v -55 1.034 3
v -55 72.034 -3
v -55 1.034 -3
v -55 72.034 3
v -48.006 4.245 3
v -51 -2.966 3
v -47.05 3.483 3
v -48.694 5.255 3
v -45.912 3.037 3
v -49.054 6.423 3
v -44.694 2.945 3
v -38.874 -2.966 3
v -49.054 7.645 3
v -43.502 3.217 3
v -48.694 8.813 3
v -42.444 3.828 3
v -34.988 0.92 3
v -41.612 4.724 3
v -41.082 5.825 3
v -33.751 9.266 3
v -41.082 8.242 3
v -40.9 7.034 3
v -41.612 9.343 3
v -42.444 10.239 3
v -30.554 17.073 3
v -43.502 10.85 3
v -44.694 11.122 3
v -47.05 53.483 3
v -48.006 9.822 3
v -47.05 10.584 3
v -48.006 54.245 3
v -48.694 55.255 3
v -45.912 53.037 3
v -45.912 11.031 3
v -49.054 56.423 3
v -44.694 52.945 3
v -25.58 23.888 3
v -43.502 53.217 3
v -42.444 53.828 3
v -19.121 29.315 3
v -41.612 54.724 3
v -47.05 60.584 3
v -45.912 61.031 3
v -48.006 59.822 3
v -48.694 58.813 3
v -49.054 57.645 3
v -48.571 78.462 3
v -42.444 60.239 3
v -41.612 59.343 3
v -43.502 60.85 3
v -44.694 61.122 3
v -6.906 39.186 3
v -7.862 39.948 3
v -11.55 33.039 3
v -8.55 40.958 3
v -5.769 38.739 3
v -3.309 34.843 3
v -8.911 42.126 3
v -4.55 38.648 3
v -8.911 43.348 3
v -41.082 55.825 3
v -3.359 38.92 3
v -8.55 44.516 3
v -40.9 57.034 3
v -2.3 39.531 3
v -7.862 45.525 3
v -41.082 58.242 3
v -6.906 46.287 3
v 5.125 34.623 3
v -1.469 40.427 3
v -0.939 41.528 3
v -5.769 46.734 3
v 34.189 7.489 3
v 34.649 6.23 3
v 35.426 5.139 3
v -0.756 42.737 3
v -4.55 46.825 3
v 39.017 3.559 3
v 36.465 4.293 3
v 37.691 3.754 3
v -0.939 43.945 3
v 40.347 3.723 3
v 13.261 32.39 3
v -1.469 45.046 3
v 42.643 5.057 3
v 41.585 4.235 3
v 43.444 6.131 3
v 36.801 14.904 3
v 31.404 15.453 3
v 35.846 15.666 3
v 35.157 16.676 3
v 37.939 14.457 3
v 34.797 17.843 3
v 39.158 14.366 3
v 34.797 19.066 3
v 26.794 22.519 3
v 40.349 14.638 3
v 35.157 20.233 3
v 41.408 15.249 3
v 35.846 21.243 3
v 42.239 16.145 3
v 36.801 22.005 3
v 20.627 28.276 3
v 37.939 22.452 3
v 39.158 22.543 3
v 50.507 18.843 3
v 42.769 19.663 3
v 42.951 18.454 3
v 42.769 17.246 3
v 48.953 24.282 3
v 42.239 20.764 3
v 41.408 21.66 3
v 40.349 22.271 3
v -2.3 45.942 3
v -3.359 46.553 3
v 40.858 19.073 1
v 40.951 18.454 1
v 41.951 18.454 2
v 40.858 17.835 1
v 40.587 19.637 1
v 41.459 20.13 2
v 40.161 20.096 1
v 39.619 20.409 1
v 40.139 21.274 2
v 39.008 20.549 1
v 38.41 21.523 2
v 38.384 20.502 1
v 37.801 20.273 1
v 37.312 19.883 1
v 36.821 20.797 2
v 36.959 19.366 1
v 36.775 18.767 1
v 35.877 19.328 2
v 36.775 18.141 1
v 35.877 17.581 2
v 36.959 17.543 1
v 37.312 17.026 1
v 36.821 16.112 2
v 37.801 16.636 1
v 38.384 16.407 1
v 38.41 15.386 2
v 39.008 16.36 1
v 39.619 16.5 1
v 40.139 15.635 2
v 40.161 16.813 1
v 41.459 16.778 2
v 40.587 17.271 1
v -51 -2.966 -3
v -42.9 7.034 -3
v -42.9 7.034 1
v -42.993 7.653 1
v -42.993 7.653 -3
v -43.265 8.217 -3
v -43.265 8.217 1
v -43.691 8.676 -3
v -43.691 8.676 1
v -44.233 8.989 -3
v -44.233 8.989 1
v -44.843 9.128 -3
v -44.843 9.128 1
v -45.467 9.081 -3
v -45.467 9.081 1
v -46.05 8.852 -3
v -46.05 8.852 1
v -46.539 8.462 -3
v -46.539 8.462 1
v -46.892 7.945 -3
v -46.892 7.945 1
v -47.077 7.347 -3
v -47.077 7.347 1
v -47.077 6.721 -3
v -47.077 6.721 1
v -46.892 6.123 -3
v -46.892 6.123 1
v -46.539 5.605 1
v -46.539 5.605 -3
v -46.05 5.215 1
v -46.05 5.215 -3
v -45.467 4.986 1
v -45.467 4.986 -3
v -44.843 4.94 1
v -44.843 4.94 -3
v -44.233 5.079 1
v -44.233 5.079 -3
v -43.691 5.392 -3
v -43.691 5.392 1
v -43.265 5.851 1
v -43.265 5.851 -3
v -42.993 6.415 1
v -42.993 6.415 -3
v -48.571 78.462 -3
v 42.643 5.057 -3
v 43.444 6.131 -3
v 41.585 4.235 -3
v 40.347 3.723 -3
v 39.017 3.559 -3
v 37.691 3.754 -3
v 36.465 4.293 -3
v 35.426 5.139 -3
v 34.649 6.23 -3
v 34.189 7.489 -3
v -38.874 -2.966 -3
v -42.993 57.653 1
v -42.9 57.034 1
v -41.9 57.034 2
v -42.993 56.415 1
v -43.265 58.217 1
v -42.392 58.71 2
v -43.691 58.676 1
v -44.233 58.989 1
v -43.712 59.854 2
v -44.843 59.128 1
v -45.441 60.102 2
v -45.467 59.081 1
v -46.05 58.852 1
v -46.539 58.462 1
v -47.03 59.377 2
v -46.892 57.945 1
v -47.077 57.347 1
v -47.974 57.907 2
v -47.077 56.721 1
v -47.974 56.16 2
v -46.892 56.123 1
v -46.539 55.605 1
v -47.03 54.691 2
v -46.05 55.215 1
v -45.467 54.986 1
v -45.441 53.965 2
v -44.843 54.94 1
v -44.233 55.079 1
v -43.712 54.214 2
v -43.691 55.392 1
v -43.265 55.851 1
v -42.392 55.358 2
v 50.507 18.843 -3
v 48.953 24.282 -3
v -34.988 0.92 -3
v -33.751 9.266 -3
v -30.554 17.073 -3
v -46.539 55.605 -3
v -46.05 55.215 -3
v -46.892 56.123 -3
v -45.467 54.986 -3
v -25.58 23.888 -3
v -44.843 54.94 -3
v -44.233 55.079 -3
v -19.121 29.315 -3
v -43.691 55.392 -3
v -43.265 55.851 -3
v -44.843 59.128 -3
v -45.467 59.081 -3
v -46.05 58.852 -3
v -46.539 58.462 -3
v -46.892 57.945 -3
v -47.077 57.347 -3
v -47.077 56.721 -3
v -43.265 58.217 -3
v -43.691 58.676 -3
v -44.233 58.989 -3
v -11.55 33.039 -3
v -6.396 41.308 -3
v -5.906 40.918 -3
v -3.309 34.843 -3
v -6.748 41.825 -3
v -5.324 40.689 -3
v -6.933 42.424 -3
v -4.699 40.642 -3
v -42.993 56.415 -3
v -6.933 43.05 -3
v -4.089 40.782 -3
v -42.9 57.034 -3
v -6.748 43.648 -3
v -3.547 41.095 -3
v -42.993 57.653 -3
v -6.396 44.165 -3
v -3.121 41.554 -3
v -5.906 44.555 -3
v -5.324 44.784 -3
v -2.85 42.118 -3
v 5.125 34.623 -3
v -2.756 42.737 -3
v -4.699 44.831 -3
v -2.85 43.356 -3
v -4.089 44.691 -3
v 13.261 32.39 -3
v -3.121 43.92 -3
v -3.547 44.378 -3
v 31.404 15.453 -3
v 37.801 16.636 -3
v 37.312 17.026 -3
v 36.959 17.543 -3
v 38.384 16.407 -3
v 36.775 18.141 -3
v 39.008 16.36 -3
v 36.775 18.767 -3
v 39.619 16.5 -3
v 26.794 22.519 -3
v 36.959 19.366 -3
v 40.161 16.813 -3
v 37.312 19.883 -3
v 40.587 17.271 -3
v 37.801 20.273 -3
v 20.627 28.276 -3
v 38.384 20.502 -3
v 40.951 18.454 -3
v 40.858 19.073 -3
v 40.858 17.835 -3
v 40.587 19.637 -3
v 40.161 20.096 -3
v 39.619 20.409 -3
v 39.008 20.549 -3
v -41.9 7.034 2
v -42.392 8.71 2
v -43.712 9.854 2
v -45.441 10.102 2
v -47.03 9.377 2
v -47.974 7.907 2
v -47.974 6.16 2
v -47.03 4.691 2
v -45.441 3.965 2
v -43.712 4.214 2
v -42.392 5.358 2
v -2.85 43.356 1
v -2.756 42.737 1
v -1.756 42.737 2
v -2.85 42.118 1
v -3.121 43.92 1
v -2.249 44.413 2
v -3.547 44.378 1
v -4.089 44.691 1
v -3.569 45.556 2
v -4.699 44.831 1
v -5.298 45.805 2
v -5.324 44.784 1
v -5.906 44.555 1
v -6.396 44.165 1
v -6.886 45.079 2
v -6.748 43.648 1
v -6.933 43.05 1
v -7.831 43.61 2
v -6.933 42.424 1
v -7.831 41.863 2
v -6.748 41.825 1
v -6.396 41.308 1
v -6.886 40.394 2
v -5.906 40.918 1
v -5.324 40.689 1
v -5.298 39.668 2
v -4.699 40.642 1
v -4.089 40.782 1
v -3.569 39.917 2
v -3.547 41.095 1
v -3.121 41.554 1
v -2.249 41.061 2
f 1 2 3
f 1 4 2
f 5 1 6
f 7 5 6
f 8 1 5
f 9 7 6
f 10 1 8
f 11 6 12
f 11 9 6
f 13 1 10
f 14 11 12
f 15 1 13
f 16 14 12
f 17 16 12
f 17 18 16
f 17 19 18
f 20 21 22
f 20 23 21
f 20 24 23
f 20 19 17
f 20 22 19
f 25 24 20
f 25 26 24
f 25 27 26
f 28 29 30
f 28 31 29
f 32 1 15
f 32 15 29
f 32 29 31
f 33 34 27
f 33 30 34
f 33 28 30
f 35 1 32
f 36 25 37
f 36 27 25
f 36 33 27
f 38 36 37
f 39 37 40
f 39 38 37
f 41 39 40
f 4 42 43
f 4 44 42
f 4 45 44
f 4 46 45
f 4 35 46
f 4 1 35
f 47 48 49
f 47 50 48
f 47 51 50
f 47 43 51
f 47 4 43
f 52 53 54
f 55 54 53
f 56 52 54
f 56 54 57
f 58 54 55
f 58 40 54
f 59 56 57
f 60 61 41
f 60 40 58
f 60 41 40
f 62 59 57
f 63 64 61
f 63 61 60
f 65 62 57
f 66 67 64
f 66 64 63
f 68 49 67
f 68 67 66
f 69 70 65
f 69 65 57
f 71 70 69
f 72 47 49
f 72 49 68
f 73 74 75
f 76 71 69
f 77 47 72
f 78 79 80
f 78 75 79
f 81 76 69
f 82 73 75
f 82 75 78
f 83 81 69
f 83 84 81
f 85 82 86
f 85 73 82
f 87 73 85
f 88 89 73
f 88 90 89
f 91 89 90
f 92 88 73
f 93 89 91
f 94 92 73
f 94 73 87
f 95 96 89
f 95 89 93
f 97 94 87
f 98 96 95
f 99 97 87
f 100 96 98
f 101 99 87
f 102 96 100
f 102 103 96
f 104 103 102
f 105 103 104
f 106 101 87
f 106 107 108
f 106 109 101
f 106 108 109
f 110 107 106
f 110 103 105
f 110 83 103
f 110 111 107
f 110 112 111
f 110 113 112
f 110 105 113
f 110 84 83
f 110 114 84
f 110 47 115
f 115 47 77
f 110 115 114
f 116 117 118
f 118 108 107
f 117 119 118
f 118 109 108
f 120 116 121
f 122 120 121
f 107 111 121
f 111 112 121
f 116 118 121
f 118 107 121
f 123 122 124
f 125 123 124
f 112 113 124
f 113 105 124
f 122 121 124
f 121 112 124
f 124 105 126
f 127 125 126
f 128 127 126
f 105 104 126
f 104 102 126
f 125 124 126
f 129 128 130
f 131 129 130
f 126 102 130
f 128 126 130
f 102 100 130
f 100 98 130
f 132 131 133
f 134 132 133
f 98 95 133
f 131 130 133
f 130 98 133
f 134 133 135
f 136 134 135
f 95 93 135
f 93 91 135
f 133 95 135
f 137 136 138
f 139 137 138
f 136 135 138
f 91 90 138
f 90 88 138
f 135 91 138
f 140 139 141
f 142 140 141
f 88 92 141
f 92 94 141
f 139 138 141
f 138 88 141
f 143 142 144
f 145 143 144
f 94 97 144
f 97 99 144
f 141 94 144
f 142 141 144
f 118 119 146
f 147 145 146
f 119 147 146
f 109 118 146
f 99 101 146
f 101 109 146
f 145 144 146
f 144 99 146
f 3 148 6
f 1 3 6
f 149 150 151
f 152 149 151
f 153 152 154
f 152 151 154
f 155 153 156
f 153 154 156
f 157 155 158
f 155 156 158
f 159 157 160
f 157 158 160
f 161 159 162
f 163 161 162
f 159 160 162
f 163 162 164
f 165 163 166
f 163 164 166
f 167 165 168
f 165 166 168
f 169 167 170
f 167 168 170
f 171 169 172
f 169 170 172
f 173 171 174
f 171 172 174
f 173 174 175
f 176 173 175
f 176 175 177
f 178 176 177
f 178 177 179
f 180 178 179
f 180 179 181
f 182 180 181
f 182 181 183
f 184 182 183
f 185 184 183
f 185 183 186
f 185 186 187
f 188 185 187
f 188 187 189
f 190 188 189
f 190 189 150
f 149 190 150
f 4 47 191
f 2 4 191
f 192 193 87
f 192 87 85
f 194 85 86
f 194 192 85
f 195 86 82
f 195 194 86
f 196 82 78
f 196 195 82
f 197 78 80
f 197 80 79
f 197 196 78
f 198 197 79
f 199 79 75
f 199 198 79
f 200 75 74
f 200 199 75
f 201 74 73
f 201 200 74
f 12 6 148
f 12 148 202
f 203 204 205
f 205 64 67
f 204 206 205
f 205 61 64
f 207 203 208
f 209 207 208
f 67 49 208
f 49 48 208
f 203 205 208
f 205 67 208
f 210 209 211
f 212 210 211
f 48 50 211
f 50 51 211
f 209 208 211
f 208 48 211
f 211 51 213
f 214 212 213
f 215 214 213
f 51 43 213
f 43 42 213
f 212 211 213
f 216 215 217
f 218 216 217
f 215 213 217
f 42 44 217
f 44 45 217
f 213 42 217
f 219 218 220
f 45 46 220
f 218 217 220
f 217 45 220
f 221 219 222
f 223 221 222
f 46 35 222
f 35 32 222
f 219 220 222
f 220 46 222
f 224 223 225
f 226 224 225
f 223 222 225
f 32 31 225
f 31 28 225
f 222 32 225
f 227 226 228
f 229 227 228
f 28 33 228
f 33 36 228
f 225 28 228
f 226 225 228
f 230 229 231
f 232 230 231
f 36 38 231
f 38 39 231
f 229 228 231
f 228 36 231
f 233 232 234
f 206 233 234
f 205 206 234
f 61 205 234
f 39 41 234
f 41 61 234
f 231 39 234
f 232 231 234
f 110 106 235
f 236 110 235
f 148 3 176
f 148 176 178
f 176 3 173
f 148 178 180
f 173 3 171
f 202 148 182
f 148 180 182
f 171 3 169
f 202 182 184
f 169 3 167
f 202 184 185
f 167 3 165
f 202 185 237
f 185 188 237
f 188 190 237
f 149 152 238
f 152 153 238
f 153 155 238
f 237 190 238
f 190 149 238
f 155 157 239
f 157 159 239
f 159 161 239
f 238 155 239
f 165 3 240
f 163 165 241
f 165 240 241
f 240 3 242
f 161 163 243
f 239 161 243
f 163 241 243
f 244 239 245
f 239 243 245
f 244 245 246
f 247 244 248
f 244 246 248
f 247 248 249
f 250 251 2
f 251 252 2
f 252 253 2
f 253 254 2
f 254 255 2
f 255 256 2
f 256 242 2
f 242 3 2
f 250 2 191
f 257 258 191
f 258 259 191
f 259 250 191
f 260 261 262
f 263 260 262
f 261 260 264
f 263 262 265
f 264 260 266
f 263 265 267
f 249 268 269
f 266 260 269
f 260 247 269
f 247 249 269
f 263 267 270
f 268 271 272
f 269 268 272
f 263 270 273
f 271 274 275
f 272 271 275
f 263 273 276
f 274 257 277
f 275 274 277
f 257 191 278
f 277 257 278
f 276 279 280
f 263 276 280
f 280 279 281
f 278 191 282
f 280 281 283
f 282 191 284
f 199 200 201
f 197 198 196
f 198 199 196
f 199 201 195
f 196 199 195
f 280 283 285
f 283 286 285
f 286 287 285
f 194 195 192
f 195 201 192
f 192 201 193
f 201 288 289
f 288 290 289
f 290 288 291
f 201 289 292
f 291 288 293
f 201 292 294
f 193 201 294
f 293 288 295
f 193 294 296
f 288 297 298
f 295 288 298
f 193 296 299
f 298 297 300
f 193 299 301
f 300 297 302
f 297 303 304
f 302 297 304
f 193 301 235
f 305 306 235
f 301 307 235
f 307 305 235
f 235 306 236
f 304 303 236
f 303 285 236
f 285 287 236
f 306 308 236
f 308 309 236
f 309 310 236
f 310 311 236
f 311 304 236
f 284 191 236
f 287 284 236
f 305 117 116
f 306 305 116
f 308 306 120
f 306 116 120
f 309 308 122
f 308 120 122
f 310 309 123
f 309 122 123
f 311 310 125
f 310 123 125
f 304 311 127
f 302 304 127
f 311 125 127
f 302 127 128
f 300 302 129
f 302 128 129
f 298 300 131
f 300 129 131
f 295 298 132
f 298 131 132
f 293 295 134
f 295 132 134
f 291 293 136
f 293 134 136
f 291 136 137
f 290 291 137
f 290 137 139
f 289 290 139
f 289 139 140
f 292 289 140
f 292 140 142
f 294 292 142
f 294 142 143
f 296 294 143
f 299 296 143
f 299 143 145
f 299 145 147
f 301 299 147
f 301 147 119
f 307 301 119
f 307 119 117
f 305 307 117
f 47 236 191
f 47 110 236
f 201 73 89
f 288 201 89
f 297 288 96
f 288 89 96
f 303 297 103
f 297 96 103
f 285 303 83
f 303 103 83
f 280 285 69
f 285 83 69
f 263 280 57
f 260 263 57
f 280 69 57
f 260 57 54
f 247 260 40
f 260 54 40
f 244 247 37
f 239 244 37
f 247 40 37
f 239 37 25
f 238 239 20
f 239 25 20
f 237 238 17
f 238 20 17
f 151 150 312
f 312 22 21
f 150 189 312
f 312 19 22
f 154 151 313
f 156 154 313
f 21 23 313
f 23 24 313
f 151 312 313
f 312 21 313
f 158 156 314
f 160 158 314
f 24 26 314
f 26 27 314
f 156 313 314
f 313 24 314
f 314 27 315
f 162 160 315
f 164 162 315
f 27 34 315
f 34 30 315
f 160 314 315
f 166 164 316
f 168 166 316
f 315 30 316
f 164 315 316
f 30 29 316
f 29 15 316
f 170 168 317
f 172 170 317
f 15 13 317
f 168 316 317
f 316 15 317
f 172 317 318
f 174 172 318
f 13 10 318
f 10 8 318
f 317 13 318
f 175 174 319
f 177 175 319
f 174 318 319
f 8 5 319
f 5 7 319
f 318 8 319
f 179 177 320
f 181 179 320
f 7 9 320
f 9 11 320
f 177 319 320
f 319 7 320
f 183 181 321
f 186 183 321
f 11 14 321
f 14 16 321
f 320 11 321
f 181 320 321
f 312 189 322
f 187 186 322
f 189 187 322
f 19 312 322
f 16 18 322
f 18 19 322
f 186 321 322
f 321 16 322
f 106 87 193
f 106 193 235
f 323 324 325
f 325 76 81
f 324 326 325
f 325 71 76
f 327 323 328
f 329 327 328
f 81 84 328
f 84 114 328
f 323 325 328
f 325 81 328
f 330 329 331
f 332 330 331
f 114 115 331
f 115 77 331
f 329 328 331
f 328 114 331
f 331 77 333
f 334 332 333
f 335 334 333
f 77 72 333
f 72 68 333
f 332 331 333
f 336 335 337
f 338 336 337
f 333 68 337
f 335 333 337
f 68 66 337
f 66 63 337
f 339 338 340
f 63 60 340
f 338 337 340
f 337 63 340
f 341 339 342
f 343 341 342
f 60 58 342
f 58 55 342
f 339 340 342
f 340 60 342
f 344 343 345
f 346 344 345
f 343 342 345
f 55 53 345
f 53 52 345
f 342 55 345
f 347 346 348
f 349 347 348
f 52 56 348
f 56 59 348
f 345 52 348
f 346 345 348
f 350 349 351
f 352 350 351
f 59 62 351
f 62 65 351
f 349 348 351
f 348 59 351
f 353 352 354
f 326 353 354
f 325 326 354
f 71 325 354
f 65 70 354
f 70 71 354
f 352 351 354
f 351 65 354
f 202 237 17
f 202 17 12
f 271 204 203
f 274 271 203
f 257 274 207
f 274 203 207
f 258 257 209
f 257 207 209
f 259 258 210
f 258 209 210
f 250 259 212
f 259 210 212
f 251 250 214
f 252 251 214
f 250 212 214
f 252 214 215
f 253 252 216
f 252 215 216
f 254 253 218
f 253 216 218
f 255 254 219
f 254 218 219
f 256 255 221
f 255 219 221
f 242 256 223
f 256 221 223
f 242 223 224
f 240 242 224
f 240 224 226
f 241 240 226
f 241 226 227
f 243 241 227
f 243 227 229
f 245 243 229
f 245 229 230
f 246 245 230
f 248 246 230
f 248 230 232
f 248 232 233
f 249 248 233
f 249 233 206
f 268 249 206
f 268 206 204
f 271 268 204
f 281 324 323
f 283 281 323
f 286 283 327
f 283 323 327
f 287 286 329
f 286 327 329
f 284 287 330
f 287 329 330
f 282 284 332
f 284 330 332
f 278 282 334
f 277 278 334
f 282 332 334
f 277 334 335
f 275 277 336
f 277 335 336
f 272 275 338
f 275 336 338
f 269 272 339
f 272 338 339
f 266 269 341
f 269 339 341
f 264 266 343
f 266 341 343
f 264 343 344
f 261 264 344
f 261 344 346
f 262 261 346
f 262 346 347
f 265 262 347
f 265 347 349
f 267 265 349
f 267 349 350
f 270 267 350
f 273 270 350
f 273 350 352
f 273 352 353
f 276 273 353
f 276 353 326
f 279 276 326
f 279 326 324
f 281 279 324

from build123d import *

# Parameters (mm, degrees)
SKETCH_1_R          = 2.1
SKETCH_1_R_2        = 4
SKETCH_1_R_3        = 11
EXTRUDE_1_DEPTH     = 3
SKETCH_3_R          = 2.1
CUT_EXTRUDE_1_DEPTH = 99.947101842
CHAMFER_2_SIZE      = 4
CHAMFER_3_SIZE      = 10
CHAMFER_3_SIZE2     = 7.354021529
SKETCH_4_W          = 7.6
SKETCH_4_H          = 9.2
CUT_EXTRUDE_2_DEPTH = 97.00692173
FILLET_1_R          = 2
SKETCH_5_R          = 2.1
CUT_EXTRUDE_3_DEPTH = 97.00692173
CHAMFER_1_SIZE      = 2
SKETCH_6_R          = 35
CUT_EXTRUDE_4_DEPTH = 97.00692173
FILLET_START        = -3
FILLET_2_DEPTH      = 6
CHAMFER_4_SIZE      = 4


with BuildPart() as part:
    # 草图1 → 凸台-拉伸1 (new, symmetric)
    with BuildSketch(Plane.XY):
        with BuildLine():
            Line((-55, 82.03370626), (-55, -2.96629374))
            Line((-55, -2.96629374), (-34.874074919, -2.96629374))
            ThreePointArc((-34.874074919, -2.96629374), (-7.334524273, -34.22286887), (30.595504664, -16.997502591))
            Line((30.595504664, -16.997502591), (52.449436567, 22.339574834))
            Line((52.449436567, 22.339574834), (-55, 82.03370626))
        make_face()
        with Locations((29, 0)):
            Circle(SKETCH_1_R, mode=Mode.SUBTRACT)
        with Locations((-14.5, -25.11473671)):
            Circle(SKETCH_1_R, mode=Mode.SUBTRACT)
        with Locations((-14.5, 25.11473671)):
            Circle(SKETCH_1_R, mode=Mode.SUBTRACT)
        with Locations((-9.625, 16.670989023)):
            Circle(SKETCH_1_R_2, mode=Mode.SUBTRACT)
        Circle(SKETCH_1_R_3, mode=Mode.SUBTRACT)
    extrude(amount=EXTRUDE_1_DEPTH, both=True)

    # 草图3 → 切除-拉伸1 (cut, through all)
    with BuildSketch(Plane.XY.offset(3)):
        with Locations((-45, 7.03370626)):
            Circle(SKETCH_3_R)
        with Locations((-45, 57.03370626)):
            Circle(SKETCH_3_R)
    extrude(amount=-CUT_EXTRUDE_1_DEPTH, mode=Mode.SUBTRACT)

    # 倒角2
    chamfer_2_edges = [part.edges().sort_by_distance(p)[0] for p in [
        (52.449436567, 22.339574834, 0),
        (-55, -2.96629374, 0),
    ]]
    chamfer(chamfer_2_edges, length=CHAMFER_2_SIZE)

    # 倒角3
    chamfer_3_edges = [part.edges().sort_by_distance(p)[0] for p in [
        (-55, 82.03370626, 0),
    ]]
    chamfer_3_side = [part.faces().sort_by_distance(p)[0] for p in [
        (-55, 41.53370626, 0),
    ]]
    chamfer(chamfer_3_edges, length=CHAMFER_3_SIZE, length2=CHAMFER_3_SIZE2, reference=chamfer_3_side[0])

    # 草图4 → 切除-拉伸2 (cut, through all)
    with BuildSketch(Plane.XY.offset(3)):
        with Locations((-18.5, 0)):
            Rectangle(SKETCH_4_W, SKETCH_4_H)
    extrude(amount=-CUT_EXTRUDE_2_DEPTH, mode=Mode.SUBTRACT)

    # 圆角1
    fillet_1_edges = [part.edges().sort_by_distance(p)[0] for p in [
        (-14.7, 4.6, 0),
        (-14.7, -4.6, 0),
        (-22.3, -4.6, 0),
        (-22.3, 4.6, 0),
    ]]
    fillet(fillet_1_edges, radius=FILLET_1_R)

    # 草图5 → 切除-拉伸3 (cut, through all)
    with BuildSketch(Plane.XY.offset(3)):
        with Locations((-4.856429312, 42.736577944)):
            Circle(SKETCH_5_R)
        with Locations((38.851434494, 18.454431385)):
            Circle(SKETCH_5_R)
    extrude(amount=-CUT_EXTRUDE_3_DEPTH, mode=Mode.SUBTRACT)

    # 倒角1
    chamfer_1_edges = [part.edges().sort_by_distance(p)[0] for p in [
        (-6.956429312, 42.736577944, 3),
        (36.751434494, 18.454431385, 3),
        (26.9, 0, 3),
        (-47.1, 7.03370626, 3),
        (-47.1, 57.03370626, 3),
    ]]
    chamfer(chamfer_1_edges, length=CHAMFER_1_SIZE)

    # 草图6 → 切除-拉伸4 (cut, through all)
    with BuildSketch(Plane.XY.offset(3)):
        Circle(SKETCH_6_R)
    extrude(amount=-CUT_EXTRUDE_4_DEPTH, mode=Mode.SUBTRACT)

    # 圆角2: read off the stored shape, not the designer's step
    # 圆角2 outline → 圆角2 (cut)
    with BuildSketch(Plane.XY.offset(FILLET_START)):
        with BuildLine():
            ThreePointArc((43.444408883, 6.130525003), (38.347542021, 3.611739847), (34.18941969, 7.488897201))
            ThreePointArc((34.18941969, 7.488897201), (34.62899868, -5.082563371), (30.595504664, -16.997502591))
            Line((30.595504664, -16.997502591), (43.444408883, 6.130525003))
        make_face()
    extrude(amount=FILLET_2_DEPTH, mode=Mode.SUBTRACT)

    # 倒角4
    # the kernel refuses this chamfer: 4, 3.699752538 mm, written as the material it takes off along each edge
    with BuildSketch(Plane(origin=(-34.874074919, -2.96629374, 13.286731952), x_dir=(-0.029279801283292956, 0.9995712547071425, 0), z_dir=(0, 0, -1))) as chamfer_4_piece_1:
        with BuildLine():
            Line((3.887831943, 0), (CHAMFER_4_SIZE * 0.0292798012833, -CHAMFER_4_SIZE * 0.999571254707))
            Line((CHAMFER_4_SIZE * 0.0292798012833, -CHAMFER_4_SIZE * 0.999571254707), (0, 0))
            ThreePointArc((0, 0), (1.998980438, -0.05398137), (3.887831943, 0))
        make_face()
    extrude(amount=26.573463904, mode=Mode.SUBTRACT)


solid = part.part
